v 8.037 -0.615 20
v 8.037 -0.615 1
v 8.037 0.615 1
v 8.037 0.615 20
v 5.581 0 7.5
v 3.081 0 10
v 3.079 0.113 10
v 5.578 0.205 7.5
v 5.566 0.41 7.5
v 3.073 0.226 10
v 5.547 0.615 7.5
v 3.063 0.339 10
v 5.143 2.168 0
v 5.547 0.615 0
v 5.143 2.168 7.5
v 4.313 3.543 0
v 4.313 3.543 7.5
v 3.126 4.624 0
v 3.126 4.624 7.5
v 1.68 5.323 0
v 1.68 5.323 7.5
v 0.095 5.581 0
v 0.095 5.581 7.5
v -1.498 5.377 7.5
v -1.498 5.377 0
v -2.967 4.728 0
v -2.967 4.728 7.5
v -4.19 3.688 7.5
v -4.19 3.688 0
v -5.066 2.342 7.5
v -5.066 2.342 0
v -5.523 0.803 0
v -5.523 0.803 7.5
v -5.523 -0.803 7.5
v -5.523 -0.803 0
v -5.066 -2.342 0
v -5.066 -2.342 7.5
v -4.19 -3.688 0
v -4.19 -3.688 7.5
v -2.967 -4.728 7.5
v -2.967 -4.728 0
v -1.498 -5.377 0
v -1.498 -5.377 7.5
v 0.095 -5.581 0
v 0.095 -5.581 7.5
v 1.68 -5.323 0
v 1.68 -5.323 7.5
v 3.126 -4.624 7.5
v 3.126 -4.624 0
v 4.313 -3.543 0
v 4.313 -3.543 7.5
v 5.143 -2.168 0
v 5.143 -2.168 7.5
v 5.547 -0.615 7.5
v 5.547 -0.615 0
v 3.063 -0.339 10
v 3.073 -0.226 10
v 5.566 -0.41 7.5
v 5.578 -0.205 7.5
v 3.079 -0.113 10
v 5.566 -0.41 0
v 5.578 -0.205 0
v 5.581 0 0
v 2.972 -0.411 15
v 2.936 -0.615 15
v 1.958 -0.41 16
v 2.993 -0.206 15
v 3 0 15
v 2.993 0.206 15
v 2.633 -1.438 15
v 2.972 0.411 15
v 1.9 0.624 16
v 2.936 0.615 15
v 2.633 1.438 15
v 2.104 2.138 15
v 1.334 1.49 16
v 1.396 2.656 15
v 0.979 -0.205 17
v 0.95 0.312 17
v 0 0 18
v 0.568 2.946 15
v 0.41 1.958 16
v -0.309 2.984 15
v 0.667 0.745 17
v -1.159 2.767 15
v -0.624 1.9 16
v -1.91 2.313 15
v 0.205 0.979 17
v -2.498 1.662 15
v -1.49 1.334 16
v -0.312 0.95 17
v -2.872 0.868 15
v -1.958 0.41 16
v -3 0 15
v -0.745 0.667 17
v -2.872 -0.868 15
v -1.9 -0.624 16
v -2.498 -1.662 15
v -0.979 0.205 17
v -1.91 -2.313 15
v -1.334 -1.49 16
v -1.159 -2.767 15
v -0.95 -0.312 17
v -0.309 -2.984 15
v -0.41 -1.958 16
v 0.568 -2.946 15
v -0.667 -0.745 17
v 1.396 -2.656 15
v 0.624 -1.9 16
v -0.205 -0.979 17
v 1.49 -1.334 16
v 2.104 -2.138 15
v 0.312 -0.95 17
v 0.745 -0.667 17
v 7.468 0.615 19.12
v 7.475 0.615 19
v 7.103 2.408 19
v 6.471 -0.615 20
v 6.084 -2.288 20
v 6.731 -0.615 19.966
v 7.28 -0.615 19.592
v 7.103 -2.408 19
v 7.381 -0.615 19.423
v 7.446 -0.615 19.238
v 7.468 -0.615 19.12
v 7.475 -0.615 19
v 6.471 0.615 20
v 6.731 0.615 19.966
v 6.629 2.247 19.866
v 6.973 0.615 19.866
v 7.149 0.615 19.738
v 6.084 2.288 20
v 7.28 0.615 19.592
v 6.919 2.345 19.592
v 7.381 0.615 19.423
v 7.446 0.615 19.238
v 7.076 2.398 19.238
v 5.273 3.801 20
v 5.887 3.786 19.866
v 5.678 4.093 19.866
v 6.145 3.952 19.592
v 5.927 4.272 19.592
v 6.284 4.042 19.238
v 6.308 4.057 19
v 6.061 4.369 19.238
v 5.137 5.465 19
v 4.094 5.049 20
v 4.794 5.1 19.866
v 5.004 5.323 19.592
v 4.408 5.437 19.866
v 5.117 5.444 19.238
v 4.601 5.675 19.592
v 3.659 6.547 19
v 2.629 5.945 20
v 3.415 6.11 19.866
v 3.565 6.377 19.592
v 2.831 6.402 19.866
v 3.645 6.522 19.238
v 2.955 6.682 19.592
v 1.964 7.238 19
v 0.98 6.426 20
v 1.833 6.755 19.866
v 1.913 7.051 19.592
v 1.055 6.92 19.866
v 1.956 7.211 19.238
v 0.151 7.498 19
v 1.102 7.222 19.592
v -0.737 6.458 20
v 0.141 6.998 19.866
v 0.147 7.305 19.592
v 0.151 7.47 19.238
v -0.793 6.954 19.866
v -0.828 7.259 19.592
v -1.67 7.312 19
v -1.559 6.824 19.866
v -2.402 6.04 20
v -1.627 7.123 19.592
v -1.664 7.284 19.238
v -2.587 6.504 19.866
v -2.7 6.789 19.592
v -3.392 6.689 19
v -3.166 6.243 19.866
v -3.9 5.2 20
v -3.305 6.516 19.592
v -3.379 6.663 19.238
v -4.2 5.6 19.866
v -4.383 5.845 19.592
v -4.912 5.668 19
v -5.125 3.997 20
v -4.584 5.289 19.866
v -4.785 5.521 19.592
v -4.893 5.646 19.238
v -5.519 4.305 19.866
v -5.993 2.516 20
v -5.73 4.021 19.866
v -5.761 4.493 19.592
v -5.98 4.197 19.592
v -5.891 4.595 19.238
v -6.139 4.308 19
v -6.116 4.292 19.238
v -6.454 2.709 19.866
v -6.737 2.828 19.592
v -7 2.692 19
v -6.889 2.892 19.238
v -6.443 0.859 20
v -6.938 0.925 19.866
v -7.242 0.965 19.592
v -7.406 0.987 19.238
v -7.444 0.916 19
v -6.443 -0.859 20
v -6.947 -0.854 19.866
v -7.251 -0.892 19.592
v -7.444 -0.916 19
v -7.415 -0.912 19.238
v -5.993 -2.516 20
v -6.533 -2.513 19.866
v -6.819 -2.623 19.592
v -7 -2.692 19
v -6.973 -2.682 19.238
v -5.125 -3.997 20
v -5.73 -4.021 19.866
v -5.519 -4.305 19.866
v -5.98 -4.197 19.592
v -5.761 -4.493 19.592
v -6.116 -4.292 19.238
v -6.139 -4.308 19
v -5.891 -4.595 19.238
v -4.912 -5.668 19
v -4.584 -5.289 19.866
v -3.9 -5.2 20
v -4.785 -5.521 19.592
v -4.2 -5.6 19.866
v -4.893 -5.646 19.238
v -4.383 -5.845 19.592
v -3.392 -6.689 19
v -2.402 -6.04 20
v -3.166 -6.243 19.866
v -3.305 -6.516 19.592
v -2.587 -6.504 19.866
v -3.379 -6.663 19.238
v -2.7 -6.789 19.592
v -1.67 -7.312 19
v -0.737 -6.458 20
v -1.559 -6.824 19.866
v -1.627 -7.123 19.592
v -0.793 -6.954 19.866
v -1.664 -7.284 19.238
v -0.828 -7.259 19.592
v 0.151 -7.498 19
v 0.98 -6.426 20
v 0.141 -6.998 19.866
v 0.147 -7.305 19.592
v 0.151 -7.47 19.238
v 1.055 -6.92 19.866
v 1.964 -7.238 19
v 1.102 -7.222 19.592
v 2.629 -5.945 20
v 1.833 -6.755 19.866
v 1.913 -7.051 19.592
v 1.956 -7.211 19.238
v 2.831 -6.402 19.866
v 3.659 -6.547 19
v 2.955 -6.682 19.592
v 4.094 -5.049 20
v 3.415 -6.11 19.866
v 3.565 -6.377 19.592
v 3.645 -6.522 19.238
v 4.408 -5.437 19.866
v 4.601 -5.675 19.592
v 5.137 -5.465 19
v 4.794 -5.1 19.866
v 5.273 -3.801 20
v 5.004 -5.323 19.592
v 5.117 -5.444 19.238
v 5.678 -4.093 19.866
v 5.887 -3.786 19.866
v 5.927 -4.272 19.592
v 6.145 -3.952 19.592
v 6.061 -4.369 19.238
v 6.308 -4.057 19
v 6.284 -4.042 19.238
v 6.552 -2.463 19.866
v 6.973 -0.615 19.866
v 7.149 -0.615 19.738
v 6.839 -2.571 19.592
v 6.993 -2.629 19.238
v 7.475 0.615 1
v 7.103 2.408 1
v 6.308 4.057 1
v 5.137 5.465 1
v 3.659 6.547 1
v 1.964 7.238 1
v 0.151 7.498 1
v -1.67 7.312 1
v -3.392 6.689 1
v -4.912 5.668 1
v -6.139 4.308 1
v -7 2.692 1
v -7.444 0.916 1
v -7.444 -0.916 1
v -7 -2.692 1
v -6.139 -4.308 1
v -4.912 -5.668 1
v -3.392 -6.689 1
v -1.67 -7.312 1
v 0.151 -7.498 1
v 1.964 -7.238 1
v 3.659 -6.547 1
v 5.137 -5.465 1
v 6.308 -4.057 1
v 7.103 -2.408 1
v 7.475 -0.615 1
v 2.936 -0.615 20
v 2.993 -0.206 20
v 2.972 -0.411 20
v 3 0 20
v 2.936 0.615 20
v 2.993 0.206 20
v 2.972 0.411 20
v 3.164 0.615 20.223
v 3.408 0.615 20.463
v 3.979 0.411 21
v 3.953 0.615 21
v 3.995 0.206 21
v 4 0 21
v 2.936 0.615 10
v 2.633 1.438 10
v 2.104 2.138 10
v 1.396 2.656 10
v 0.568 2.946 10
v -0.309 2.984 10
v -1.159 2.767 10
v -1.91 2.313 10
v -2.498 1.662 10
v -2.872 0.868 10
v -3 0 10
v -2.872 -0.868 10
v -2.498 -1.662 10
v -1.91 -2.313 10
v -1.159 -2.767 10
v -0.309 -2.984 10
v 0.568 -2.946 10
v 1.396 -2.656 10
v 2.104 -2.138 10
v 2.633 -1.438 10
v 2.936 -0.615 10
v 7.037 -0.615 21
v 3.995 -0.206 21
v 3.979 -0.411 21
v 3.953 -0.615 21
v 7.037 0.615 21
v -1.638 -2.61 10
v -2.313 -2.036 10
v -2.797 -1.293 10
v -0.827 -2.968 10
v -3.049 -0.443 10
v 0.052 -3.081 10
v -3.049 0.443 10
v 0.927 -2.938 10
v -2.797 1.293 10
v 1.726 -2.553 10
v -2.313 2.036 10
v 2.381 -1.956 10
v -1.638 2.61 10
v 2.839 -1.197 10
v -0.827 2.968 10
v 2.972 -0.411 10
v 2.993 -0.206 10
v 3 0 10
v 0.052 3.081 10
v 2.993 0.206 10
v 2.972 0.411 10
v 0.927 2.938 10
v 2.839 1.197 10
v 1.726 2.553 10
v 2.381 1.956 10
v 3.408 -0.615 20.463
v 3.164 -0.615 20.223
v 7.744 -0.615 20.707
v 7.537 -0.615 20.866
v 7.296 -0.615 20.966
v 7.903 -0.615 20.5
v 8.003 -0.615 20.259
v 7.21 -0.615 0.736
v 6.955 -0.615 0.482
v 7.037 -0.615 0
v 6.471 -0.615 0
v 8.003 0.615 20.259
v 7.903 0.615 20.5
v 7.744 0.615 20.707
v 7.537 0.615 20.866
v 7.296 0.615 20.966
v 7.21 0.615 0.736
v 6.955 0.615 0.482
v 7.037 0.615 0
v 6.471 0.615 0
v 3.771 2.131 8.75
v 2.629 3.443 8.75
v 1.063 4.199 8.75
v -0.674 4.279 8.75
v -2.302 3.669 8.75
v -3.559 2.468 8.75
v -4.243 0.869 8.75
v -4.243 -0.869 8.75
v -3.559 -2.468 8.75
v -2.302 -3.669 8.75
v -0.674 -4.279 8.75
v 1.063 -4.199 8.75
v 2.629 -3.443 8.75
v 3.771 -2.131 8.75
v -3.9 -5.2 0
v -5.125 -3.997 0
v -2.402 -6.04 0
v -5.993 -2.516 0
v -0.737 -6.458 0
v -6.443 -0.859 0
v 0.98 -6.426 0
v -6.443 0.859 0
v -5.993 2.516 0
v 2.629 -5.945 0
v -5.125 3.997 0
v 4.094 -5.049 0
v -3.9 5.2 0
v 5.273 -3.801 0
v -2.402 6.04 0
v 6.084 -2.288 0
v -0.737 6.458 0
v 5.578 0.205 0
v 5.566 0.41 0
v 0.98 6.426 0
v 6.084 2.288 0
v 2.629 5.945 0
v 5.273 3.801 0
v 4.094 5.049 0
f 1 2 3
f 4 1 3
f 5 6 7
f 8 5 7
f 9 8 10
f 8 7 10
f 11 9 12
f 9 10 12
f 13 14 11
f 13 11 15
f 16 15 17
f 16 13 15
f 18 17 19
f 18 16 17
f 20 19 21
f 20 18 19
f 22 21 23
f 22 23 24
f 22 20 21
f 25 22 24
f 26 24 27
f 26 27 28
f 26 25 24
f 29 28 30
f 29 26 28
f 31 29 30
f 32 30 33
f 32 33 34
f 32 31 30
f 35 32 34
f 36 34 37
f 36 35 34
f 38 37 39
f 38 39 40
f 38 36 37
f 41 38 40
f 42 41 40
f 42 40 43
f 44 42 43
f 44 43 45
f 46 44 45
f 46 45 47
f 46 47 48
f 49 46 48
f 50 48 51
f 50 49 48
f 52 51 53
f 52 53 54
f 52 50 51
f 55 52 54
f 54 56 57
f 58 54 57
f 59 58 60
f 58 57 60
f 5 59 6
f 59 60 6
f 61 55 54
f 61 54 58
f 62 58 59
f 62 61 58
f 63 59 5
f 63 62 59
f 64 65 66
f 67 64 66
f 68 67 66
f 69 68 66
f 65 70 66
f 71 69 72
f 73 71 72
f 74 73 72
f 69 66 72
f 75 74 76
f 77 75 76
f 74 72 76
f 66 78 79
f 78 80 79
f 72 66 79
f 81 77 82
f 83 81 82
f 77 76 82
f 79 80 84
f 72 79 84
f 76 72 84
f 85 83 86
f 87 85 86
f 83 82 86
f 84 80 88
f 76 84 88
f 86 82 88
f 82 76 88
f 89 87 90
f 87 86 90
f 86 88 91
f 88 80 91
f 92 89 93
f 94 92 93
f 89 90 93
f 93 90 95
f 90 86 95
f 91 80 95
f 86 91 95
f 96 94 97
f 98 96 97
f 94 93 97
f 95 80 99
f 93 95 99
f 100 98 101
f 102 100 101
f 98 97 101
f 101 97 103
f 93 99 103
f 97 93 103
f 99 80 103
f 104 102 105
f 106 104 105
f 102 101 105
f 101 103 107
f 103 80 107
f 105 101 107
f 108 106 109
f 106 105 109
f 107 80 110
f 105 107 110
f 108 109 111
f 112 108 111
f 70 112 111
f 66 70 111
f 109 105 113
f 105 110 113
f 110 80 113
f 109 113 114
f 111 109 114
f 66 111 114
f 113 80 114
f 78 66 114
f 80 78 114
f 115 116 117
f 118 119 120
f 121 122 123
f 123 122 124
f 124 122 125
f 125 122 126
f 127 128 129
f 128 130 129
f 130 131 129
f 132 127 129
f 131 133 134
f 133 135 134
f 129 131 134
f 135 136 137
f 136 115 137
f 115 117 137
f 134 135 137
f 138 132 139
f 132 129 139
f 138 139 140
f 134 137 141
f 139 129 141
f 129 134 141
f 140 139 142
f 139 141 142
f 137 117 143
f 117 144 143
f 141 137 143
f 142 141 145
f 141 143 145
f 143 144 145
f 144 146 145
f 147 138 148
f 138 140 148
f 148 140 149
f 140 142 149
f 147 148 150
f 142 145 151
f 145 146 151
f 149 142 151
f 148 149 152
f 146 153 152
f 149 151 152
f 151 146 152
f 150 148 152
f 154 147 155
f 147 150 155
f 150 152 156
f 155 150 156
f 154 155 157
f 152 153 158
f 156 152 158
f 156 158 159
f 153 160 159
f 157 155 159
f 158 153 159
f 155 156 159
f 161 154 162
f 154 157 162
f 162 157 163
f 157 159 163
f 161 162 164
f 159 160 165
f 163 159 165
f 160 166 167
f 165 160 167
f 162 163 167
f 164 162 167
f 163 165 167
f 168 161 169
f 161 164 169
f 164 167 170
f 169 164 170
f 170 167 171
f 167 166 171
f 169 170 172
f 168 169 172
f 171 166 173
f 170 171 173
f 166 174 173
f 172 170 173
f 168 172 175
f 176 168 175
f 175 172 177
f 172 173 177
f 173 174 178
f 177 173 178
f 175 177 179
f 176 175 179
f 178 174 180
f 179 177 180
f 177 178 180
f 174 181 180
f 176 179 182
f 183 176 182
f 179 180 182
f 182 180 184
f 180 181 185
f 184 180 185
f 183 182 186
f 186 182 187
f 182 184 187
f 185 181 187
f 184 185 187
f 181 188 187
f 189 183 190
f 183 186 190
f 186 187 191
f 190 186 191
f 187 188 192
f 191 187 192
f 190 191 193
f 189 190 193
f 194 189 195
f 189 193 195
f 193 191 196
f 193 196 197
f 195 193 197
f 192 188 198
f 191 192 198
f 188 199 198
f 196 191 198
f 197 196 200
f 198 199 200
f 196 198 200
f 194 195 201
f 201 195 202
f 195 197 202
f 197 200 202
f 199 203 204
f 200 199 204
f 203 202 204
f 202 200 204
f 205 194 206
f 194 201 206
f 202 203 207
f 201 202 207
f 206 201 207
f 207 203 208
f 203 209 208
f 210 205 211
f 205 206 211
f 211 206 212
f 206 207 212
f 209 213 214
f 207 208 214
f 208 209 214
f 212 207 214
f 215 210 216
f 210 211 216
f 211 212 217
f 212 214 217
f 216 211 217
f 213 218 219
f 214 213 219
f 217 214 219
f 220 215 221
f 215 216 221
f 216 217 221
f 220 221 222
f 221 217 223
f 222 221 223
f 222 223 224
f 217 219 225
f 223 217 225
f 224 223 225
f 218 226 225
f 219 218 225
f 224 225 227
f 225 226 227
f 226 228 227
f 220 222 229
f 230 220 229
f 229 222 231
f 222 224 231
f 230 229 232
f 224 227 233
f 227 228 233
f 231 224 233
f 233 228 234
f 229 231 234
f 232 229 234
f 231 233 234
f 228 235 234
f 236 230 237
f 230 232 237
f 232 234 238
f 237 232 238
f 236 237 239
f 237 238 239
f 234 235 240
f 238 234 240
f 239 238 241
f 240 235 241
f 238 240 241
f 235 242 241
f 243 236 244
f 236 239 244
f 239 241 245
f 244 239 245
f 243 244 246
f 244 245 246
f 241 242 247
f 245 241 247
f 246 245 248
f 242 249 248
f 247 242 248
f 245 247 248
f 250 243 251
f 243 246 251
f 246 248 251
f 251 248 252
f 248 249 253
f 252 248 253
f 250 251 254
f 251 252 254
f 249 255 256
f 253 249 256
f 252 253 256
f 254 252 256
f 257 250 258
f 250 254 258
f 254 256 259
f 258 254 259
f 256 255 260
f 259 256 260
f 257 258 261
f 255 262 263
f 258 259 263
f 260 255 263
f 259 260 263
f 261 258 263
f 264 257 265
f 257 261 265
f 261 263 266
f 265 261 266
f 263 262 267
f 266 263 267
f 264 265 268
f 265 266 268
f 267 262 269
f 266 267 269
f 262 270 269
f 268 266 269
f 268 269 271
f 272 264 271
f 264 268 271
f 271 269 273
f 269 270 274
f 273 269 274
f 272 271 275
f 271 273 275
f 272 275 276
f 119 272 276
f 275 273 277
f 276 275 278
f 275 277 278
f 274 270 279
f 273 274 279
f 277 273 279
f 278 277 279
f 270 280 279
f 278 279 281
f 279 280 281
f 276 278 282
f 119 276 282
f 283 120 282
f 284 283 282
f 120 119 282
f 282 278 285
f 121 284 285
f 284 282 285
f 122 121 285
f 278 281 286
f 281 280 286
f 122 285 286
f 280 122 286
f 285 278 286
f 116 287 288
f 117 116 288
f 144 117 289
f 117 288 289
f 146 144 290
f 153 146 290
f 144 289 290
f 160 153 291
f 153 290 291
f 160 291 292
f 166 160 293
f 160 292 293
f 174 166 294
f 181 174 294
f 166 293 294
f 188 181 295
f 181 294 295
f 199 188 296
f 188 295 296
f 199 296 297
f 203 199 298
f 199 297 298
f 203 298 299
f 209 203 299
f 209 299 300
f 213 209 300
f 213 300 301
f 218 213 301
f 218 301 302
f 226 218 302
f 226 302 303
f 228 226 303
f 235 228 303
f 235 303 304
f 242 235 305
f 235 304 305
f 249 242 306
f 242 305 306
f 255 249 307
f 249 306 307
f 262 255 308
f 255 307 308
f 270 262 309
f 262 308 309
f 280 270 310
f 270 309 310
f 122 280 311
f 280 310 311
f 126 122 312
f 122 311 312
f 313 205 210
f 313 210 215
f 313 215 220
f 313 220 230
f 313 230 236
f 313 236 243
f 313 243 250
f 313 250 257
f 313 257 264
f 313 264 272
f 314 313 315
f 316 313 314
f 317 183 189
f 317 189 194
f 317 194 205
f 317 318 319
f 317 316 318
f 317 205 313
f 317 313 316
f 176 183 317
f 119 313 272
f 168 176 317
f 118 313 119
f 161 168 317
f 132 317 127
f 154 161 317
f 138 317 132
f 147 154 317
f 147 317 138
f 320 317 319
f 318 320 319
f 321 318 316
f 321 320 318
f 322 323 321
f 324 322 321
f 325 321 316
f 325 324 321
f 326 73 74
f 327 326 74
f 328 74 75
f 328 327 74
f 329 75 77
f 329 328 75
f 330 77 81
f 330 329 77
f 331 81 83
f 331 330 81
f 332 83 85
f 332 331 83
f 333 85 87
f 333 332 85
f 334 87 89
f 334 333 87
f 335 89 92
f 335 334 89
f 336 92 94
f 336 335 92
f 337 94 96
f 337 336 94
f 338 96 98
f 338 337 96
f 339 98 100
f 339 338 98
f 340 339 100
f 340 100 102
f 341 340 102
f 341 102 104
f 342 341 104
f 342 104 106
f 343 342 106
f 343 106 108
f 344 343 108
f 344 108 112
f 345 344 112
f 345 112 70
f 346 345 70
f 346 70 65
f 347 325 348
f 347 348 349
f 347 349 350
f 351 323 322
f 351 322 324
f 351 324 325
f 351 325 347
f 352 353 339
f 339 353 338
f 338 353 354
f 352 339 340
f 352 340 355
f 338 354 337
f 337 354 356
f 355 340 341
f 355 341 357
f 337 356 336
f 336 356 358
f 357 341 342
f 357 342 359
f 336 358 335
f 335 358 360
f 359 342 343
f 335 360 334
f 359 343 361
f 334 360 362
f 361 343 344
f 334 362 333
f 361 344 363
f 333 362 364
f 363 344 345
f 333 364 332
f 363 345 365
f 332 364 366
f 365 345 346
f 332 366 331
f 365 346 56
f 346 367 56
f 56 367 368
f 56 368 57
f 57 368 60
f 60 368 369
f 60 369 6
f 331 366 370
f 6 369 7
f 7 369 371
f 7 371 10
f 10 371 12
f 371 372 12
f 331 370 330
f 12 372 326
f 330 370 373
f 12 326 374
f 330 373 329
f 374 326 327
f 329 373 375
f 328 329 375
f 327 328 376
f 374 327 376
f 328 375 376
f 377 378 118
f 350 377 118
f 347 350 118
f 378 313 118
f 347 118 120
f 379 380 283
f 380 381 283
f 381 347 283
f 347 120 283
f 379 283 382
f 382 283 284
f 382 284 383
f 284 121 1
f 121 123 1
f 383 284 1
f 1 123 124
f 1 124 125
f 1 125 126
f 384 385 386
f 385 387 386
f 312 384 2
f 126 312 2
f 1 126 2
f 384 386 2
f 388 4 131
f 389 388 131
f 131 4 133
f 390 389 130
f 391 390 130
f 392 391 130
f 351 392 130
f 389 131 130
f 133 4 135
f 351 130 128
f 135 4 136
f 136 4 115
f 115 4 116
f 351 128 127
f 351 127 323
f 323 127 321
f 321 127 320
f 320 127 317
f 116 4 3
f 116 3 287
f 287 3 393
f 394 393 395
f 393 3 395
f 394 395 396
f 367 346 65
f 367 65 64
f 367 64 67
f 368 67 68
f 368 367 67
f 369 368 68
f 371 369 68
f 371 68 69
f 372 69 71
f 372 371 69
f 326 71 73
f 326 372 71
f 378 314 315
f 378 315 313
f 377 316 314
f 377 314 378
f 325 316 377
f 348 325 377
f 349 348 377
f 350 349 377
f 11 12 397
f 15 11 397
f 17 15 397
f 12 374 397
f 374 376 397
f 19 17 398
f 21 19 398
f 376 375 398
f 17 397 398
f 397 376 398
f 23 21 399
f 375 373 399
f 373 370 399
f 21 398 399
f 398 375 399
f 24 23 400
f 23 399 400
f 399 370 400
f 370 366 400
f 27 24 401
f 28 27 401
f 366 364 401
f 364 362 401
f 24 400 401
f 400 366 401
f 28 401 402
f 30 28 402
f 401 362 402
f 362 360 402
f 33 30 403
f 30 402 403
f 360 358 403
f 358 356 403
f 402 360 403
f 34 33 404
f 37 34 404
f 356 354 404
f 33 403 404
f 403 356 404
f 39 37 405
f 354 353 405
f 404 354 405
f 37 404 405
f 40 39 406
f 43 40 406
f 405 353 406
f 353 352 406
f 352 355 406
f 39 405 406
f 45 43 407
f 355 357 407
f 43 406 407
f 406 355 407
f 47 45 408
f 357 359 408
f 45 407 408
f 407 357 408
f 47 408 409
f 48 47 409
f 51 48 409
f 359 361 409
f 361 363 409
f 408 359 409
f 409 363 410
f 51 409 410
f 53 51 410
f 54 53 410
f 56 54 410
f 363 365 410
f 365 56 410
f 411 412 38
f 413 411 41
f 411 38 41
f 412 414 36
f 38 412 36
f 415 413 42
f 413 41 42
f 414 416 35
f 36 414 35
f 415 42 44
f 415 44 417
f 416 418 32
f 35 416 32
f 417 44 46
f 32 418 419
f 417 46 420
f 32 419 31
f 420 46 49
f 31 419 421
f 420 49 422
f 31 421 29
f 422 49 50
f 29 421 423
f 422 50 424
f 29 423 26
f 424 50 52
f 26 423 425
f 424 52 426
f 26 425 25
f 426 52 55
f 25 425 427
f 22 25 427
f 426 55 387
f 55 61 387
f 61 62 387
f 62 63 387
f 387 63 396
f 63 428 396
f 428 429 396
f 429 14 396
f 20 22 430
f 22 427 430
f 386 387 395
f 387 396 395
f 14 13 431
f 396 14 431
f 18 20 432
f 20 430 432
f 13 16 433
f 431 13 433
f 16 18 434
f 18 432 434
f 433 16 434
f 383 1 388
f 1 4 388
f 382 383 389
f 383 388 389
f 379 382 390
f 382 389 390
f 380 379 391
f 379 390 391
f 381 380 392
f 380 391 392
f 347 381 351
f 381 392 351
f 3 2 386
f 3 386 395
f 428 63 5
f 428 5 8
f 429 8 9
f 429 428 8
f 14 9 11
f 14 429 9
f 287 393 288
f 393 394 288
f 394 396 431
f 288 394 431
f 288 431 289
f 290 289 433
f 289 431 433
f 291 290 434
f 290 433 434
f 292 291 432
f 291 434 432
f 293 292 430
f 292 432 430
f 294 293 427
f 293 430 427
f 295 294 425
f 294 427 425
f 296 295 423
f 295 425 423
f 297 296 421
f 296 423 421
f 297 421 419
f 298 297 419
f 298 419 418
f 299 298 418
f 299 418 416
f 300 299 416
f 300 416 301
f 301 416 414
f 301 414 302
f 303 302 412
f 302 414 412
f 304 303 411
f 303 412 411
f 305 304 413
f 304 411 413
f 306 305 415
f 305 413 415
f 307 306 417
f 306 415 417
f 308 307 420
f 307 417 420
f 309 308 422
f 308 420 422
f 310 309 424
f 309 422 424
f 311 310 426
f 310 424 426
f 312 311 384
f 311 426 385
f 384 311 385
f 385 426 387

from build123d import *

# Parameters (mm, degrees)
F1_DEPTH = 20
F2_DEPTH = 21
F3_DEPTH = 18
F4_DEPTH = 10
F10_R    = 1
F6_SIZE  = 0.99999
F7_SIZE  = 1
F8_SIZE  = 1
F9_SIZE  = 2.5


# Not quite as in the source:
# - a fillet or chamfer that OpenCascade refuses, or shapes differently, is made with other operations: its cross-section is extruded or revolved along the edge and cut away or added
# - a fillet or chamfer is up to 0.001 mm smaller than in the source, because OpenCascade refuses the exact size


with BuildPart() as f1:
    # F0 (on Top) → F1 (new body)
    with BuildSketch(Plane.XY):
        with BuildLine():
            ThreePointArc((3, 0), (2.9840537841, 0.308906157), (2.9363846575, 0.6145283911))
            Line((2.9363846575, 0.6145283911), (2.9363846575, -0.6145283911))
            ThreePointArc((2.9363846575, -0.6145283911), (2.9840537841, -0.308906157), (3, 0))
        make_face()
        with BuildLine():
            Line((5.5474227354, 0.6145283911), (7.4747812581, 0.6145283911))
            ThreePointArc((7.4747812581, 0.6145283911), (-7.5, 0), (7.4747812581, -0.6145283911))
            Line((7.4747812581, -0.6145283911), (5.5474227354, -0.6145283911))
            ThreePointArc((5.5474227354, -0.6145283911), (-5.5813568376, 0), (5.5474227354, 0.6145283911))
        make_face()
        with BuildLine():
            Line((2.9363846575, 0.6145283911), (5.5474227354, 0.6145283911))
            ThreePointArc((5.5474227354, 0.6145283911), (-5.5813568376, 0), (5.5474227354, -0.6145283911))
            Line((5.5474227354, -0.6145283911), (2.9363846575, -0.6145283911))
            ThreePointArc((2.9363846575, -0.6145283911), (-3, 0), (2.9363846575, 0.6145283911))
        make_face()
        with BuildLine():
            Line((2.9363846575, -0.6145283911), (2.9363846575, 0.6145283911))
            ThreePointArc((2.9363846575, 0.6145283911), (-3, 0), (2.9363846575, -0.6145283911))
        make_face()
        with BuildLine():
            ThreePointArc((7.4747812581, -0.6145283911), (7.4936926624, -0.3075228156), (7.5, 0))
            ThreePointArc((7.5, 0), (7.4936926624, 0.3075228156), (7.4747812581, 0.6145283911))
            Line((7.4747812581, 0.6145283911), (5.5474227354, 0.6145283911))
            ThreePointArc((5.5474227354, 0.6145283911), (5.5728668548, 0.3077322971), (5.5813568376, 0))
            ThreePointArc((5.5813568376, 0), (5.5728668548, -0.3077322971), (5.5474227354, -0.6145283911))
            Line((5.5474227354, -0.6145283911), (7.4747812581, -0.6145283911))
        make_face()
        with BuildLine():
            ThreePointArc((5.5813568376, 0), (5.5728668548, 0.3077322971), (5.5474227354, 0.6145283911))
            Line((5.5474227354, 0.6145283911), (2.9363846575, 0.6145283911))
            ThreePointArc((2.9363846575, 0.6145283911), (2.9840537841, 0.308906157), (3, 0))
            ThreePointArc((3, 0), (2.9840537841, -0.308906157), (2.9363846575, -0.6145283911))
            Line((2.9363846575, -0.6145283911), (5.5474227354, -0.6145283911))
            ThreePointArc((5.5474227354, -0.6145283911), (5.5728668548, -0.3077322971), (5.5813568376, 0))
        make_face()
    extrude(amount=F1_DEPTH)

    # F0 (on Top) → F2 (join)
    with BuildSketch(Plane.XY):
        with BuildLine():
            ThreePointArc((7.4747812581, 0.6145283911), (7.4936926624, 0.3075228156), (7.5, 0))
            ThreePointArc((7.5, 0), (7.4936926624, -0.3075228156), (7.4747812581, -0.6145283911))
            Line((7.4747812581, -0.6145283911), (8.0371221235, -0.6145283911))
            Line((8.0371221235, -0.6145283911), (8.0371221235, 0.6145283911))
            Line((8.0371221235, 0.6145283911), (7.4747812581, 0.6145283911))
        make_face()
        with BuildLine():
            ThreePointArc((7.4747812581, -0.6145283911), (7.4936926624, -0.3075228156), (7.5, 0))
            ThreePointArc((7.5, 0), (7.4936926624, 0.3075228156), (7.4747812581, 0.6145283911))
            Line((7.4747812581, 0.6145283911), (5.5474227354, 0.6145283911))
            ThreePointArc((5.5474227354, 0.6145283911), (5.5728668548, 0.3077322971), (5.5813568376, 0))
            ThreePointArc((5.5813568376, 0), (5.5728668548, -0.3077322971), (5.5474227354, -0.6145283911))
            Line((5.5474227354, -0.6145283911), (7.4747812581, -0.6145283911))
        make_face()
        with BuildLine():
            ThreePointArc((5.5813568376, 0), (5.5728668548, 0.3077322971), (5.5474227354, 0.6145283911))
            Line((5.5474227354, 0.6145283911), (2.9363846575, 0.6145283911))
            ThreePointArc((2.9363846575, 0.6145283911), (2.9840537841, 0.308906157), (3, 0))
            ThreePointArc((3, 0), (2.9840537841, -0.308906157), (2.9363846575, -0.6145283911))
            Line((2.9363846575, -0.6145283911), (5.5474227354, -0.6145283911))
            ThreePointArc((5.5474227354, -0.6145283911), (5.5728668548, -0.3077322971), (5.5813568376, 0))
        make_face()
    extrude(amount=F2_DEPTH)

    # F0 (on Top) → F3 (cut)
    with BuildSketch(Plane.XY):
        with BuildLine():
            Line((2.9363846575, -0.6145283911), (2.9363846575, 0.6145283911))
            ThreePointArc((2.9363846575, 0.6145283911), (-3, 0), (2.9363846575, -0.6145283911))
        make_face()
        with BuildLine():
            ThreePointArc((3, 0), (2.9840537841, 0.308906157), (2.9363846575, 0.6145283911))
            Line((2.9363846575, 0.6145283911), (2.9363846575, -0.6145283911))
            ThreePointArc((2.9363846575, -0.6145283911), (2.9840537841, -0.308906157), (3, 0))
        make_face()
    extrude(amount=F3_DEPTH, mode=Mode.SUBTRACT)

    # F0 (on Top) → F4 (cut)
    with BuildSketch(Plane.XY):
        with BuildLine():
            Line((2.9363846575, 0.6145283911), (5.5474227354, 0.6145283911))
            ThreePointArc((5.5474227354, 0.6145283911), (-5.5813568376, 0), (5.5474227354, -0.6145283911))
            Line((5.5474227354, -0.6145283911), (2.9363846575, -0.6145283911))
            ThreePointArc((2.9363846575, -0.6145283911), (-3, 0), (2.9363846575, 0.6145283911))
        make_face()
        with BuildLine():
            ThreePointArc((5.5813568376, 0), (5.5728668548, 0.3077322971), (5.5474227354, 0.6145283911))
            Line((5.5474227354, 0.6145283911), (2.9363846575, 0.6145283911))
            ThreePointArc((2.9363846575, 0.6145283911), (2.9840537841, 0.308906157), (3, 0))
            ThreePointArc((3, 0), (2.9840537841, -0.308906157), (2.9363846575, -0.6145283911))
            Line((2.9363846575, -0.6145283911), (5.5474227354, -0.6145283911))
            ThreePointArc((5.5474227354, -0.6145283911), (5.5728668548, -0.3077322971), (5.5813568376, 0))
        make_face()
    extrude(amount=F4_DEPTH, mode=Mode.SUBTRACT)

    # F10
    f10_edges = [f1.edges().sort_by_distance(p)[0] for p in [
        (-7.5, 0, 20),
        (8.037122, 0, 21),
    ]]
    fillet(f10_edges, radius=F10_R)

    # F5: chamfer of 3 on 1 edges, made by hand

    # F5_s1 → F5_t2 (revolve)
    with BuildSketch(Plane(origin=(0, 0, 0), x_dir=(0, 0, 1), z_dir=(-0.204842797, -0.9787948858, 0))):
        Polygon((15, -3), (18, 0), (18, -3), align=None)
    revolve(axis=Axis((0, 0, 18), (0, 0, 1)))

    # F6 (size 1 in the source; OpenCascade refuses exactly that, so slightly less here)
    f6_edges = [f1.edges().sort_by_distance(p)[0] for p in [
        (3, 0, 21),
    ]]
    chamfer(f6_edges, length=F6_SIZE)

    # F7
    f7_edges = [f1.edges().sort_by_distance(p)[0] for p in [
        (-7.5, 0, 0),
    ]]
    chamfer(f7_edges, length=F7_SIZE)

    # F8
    f8_edges = [f1.edges().sort_by_distance(p)[0] for p in [
        (8.037122, 0, 0),
    ]]
    chamfer(f8_edges, length=F8_SIZE)

    # F9
    f9_edges = [f1.edges().sort_by_distance(p)[0] for p in [
        (-5.547423, 0.614528, 10),
    ]]
    chamfer(f9_edges, length=F9_SIZE)


solid = f1.part
